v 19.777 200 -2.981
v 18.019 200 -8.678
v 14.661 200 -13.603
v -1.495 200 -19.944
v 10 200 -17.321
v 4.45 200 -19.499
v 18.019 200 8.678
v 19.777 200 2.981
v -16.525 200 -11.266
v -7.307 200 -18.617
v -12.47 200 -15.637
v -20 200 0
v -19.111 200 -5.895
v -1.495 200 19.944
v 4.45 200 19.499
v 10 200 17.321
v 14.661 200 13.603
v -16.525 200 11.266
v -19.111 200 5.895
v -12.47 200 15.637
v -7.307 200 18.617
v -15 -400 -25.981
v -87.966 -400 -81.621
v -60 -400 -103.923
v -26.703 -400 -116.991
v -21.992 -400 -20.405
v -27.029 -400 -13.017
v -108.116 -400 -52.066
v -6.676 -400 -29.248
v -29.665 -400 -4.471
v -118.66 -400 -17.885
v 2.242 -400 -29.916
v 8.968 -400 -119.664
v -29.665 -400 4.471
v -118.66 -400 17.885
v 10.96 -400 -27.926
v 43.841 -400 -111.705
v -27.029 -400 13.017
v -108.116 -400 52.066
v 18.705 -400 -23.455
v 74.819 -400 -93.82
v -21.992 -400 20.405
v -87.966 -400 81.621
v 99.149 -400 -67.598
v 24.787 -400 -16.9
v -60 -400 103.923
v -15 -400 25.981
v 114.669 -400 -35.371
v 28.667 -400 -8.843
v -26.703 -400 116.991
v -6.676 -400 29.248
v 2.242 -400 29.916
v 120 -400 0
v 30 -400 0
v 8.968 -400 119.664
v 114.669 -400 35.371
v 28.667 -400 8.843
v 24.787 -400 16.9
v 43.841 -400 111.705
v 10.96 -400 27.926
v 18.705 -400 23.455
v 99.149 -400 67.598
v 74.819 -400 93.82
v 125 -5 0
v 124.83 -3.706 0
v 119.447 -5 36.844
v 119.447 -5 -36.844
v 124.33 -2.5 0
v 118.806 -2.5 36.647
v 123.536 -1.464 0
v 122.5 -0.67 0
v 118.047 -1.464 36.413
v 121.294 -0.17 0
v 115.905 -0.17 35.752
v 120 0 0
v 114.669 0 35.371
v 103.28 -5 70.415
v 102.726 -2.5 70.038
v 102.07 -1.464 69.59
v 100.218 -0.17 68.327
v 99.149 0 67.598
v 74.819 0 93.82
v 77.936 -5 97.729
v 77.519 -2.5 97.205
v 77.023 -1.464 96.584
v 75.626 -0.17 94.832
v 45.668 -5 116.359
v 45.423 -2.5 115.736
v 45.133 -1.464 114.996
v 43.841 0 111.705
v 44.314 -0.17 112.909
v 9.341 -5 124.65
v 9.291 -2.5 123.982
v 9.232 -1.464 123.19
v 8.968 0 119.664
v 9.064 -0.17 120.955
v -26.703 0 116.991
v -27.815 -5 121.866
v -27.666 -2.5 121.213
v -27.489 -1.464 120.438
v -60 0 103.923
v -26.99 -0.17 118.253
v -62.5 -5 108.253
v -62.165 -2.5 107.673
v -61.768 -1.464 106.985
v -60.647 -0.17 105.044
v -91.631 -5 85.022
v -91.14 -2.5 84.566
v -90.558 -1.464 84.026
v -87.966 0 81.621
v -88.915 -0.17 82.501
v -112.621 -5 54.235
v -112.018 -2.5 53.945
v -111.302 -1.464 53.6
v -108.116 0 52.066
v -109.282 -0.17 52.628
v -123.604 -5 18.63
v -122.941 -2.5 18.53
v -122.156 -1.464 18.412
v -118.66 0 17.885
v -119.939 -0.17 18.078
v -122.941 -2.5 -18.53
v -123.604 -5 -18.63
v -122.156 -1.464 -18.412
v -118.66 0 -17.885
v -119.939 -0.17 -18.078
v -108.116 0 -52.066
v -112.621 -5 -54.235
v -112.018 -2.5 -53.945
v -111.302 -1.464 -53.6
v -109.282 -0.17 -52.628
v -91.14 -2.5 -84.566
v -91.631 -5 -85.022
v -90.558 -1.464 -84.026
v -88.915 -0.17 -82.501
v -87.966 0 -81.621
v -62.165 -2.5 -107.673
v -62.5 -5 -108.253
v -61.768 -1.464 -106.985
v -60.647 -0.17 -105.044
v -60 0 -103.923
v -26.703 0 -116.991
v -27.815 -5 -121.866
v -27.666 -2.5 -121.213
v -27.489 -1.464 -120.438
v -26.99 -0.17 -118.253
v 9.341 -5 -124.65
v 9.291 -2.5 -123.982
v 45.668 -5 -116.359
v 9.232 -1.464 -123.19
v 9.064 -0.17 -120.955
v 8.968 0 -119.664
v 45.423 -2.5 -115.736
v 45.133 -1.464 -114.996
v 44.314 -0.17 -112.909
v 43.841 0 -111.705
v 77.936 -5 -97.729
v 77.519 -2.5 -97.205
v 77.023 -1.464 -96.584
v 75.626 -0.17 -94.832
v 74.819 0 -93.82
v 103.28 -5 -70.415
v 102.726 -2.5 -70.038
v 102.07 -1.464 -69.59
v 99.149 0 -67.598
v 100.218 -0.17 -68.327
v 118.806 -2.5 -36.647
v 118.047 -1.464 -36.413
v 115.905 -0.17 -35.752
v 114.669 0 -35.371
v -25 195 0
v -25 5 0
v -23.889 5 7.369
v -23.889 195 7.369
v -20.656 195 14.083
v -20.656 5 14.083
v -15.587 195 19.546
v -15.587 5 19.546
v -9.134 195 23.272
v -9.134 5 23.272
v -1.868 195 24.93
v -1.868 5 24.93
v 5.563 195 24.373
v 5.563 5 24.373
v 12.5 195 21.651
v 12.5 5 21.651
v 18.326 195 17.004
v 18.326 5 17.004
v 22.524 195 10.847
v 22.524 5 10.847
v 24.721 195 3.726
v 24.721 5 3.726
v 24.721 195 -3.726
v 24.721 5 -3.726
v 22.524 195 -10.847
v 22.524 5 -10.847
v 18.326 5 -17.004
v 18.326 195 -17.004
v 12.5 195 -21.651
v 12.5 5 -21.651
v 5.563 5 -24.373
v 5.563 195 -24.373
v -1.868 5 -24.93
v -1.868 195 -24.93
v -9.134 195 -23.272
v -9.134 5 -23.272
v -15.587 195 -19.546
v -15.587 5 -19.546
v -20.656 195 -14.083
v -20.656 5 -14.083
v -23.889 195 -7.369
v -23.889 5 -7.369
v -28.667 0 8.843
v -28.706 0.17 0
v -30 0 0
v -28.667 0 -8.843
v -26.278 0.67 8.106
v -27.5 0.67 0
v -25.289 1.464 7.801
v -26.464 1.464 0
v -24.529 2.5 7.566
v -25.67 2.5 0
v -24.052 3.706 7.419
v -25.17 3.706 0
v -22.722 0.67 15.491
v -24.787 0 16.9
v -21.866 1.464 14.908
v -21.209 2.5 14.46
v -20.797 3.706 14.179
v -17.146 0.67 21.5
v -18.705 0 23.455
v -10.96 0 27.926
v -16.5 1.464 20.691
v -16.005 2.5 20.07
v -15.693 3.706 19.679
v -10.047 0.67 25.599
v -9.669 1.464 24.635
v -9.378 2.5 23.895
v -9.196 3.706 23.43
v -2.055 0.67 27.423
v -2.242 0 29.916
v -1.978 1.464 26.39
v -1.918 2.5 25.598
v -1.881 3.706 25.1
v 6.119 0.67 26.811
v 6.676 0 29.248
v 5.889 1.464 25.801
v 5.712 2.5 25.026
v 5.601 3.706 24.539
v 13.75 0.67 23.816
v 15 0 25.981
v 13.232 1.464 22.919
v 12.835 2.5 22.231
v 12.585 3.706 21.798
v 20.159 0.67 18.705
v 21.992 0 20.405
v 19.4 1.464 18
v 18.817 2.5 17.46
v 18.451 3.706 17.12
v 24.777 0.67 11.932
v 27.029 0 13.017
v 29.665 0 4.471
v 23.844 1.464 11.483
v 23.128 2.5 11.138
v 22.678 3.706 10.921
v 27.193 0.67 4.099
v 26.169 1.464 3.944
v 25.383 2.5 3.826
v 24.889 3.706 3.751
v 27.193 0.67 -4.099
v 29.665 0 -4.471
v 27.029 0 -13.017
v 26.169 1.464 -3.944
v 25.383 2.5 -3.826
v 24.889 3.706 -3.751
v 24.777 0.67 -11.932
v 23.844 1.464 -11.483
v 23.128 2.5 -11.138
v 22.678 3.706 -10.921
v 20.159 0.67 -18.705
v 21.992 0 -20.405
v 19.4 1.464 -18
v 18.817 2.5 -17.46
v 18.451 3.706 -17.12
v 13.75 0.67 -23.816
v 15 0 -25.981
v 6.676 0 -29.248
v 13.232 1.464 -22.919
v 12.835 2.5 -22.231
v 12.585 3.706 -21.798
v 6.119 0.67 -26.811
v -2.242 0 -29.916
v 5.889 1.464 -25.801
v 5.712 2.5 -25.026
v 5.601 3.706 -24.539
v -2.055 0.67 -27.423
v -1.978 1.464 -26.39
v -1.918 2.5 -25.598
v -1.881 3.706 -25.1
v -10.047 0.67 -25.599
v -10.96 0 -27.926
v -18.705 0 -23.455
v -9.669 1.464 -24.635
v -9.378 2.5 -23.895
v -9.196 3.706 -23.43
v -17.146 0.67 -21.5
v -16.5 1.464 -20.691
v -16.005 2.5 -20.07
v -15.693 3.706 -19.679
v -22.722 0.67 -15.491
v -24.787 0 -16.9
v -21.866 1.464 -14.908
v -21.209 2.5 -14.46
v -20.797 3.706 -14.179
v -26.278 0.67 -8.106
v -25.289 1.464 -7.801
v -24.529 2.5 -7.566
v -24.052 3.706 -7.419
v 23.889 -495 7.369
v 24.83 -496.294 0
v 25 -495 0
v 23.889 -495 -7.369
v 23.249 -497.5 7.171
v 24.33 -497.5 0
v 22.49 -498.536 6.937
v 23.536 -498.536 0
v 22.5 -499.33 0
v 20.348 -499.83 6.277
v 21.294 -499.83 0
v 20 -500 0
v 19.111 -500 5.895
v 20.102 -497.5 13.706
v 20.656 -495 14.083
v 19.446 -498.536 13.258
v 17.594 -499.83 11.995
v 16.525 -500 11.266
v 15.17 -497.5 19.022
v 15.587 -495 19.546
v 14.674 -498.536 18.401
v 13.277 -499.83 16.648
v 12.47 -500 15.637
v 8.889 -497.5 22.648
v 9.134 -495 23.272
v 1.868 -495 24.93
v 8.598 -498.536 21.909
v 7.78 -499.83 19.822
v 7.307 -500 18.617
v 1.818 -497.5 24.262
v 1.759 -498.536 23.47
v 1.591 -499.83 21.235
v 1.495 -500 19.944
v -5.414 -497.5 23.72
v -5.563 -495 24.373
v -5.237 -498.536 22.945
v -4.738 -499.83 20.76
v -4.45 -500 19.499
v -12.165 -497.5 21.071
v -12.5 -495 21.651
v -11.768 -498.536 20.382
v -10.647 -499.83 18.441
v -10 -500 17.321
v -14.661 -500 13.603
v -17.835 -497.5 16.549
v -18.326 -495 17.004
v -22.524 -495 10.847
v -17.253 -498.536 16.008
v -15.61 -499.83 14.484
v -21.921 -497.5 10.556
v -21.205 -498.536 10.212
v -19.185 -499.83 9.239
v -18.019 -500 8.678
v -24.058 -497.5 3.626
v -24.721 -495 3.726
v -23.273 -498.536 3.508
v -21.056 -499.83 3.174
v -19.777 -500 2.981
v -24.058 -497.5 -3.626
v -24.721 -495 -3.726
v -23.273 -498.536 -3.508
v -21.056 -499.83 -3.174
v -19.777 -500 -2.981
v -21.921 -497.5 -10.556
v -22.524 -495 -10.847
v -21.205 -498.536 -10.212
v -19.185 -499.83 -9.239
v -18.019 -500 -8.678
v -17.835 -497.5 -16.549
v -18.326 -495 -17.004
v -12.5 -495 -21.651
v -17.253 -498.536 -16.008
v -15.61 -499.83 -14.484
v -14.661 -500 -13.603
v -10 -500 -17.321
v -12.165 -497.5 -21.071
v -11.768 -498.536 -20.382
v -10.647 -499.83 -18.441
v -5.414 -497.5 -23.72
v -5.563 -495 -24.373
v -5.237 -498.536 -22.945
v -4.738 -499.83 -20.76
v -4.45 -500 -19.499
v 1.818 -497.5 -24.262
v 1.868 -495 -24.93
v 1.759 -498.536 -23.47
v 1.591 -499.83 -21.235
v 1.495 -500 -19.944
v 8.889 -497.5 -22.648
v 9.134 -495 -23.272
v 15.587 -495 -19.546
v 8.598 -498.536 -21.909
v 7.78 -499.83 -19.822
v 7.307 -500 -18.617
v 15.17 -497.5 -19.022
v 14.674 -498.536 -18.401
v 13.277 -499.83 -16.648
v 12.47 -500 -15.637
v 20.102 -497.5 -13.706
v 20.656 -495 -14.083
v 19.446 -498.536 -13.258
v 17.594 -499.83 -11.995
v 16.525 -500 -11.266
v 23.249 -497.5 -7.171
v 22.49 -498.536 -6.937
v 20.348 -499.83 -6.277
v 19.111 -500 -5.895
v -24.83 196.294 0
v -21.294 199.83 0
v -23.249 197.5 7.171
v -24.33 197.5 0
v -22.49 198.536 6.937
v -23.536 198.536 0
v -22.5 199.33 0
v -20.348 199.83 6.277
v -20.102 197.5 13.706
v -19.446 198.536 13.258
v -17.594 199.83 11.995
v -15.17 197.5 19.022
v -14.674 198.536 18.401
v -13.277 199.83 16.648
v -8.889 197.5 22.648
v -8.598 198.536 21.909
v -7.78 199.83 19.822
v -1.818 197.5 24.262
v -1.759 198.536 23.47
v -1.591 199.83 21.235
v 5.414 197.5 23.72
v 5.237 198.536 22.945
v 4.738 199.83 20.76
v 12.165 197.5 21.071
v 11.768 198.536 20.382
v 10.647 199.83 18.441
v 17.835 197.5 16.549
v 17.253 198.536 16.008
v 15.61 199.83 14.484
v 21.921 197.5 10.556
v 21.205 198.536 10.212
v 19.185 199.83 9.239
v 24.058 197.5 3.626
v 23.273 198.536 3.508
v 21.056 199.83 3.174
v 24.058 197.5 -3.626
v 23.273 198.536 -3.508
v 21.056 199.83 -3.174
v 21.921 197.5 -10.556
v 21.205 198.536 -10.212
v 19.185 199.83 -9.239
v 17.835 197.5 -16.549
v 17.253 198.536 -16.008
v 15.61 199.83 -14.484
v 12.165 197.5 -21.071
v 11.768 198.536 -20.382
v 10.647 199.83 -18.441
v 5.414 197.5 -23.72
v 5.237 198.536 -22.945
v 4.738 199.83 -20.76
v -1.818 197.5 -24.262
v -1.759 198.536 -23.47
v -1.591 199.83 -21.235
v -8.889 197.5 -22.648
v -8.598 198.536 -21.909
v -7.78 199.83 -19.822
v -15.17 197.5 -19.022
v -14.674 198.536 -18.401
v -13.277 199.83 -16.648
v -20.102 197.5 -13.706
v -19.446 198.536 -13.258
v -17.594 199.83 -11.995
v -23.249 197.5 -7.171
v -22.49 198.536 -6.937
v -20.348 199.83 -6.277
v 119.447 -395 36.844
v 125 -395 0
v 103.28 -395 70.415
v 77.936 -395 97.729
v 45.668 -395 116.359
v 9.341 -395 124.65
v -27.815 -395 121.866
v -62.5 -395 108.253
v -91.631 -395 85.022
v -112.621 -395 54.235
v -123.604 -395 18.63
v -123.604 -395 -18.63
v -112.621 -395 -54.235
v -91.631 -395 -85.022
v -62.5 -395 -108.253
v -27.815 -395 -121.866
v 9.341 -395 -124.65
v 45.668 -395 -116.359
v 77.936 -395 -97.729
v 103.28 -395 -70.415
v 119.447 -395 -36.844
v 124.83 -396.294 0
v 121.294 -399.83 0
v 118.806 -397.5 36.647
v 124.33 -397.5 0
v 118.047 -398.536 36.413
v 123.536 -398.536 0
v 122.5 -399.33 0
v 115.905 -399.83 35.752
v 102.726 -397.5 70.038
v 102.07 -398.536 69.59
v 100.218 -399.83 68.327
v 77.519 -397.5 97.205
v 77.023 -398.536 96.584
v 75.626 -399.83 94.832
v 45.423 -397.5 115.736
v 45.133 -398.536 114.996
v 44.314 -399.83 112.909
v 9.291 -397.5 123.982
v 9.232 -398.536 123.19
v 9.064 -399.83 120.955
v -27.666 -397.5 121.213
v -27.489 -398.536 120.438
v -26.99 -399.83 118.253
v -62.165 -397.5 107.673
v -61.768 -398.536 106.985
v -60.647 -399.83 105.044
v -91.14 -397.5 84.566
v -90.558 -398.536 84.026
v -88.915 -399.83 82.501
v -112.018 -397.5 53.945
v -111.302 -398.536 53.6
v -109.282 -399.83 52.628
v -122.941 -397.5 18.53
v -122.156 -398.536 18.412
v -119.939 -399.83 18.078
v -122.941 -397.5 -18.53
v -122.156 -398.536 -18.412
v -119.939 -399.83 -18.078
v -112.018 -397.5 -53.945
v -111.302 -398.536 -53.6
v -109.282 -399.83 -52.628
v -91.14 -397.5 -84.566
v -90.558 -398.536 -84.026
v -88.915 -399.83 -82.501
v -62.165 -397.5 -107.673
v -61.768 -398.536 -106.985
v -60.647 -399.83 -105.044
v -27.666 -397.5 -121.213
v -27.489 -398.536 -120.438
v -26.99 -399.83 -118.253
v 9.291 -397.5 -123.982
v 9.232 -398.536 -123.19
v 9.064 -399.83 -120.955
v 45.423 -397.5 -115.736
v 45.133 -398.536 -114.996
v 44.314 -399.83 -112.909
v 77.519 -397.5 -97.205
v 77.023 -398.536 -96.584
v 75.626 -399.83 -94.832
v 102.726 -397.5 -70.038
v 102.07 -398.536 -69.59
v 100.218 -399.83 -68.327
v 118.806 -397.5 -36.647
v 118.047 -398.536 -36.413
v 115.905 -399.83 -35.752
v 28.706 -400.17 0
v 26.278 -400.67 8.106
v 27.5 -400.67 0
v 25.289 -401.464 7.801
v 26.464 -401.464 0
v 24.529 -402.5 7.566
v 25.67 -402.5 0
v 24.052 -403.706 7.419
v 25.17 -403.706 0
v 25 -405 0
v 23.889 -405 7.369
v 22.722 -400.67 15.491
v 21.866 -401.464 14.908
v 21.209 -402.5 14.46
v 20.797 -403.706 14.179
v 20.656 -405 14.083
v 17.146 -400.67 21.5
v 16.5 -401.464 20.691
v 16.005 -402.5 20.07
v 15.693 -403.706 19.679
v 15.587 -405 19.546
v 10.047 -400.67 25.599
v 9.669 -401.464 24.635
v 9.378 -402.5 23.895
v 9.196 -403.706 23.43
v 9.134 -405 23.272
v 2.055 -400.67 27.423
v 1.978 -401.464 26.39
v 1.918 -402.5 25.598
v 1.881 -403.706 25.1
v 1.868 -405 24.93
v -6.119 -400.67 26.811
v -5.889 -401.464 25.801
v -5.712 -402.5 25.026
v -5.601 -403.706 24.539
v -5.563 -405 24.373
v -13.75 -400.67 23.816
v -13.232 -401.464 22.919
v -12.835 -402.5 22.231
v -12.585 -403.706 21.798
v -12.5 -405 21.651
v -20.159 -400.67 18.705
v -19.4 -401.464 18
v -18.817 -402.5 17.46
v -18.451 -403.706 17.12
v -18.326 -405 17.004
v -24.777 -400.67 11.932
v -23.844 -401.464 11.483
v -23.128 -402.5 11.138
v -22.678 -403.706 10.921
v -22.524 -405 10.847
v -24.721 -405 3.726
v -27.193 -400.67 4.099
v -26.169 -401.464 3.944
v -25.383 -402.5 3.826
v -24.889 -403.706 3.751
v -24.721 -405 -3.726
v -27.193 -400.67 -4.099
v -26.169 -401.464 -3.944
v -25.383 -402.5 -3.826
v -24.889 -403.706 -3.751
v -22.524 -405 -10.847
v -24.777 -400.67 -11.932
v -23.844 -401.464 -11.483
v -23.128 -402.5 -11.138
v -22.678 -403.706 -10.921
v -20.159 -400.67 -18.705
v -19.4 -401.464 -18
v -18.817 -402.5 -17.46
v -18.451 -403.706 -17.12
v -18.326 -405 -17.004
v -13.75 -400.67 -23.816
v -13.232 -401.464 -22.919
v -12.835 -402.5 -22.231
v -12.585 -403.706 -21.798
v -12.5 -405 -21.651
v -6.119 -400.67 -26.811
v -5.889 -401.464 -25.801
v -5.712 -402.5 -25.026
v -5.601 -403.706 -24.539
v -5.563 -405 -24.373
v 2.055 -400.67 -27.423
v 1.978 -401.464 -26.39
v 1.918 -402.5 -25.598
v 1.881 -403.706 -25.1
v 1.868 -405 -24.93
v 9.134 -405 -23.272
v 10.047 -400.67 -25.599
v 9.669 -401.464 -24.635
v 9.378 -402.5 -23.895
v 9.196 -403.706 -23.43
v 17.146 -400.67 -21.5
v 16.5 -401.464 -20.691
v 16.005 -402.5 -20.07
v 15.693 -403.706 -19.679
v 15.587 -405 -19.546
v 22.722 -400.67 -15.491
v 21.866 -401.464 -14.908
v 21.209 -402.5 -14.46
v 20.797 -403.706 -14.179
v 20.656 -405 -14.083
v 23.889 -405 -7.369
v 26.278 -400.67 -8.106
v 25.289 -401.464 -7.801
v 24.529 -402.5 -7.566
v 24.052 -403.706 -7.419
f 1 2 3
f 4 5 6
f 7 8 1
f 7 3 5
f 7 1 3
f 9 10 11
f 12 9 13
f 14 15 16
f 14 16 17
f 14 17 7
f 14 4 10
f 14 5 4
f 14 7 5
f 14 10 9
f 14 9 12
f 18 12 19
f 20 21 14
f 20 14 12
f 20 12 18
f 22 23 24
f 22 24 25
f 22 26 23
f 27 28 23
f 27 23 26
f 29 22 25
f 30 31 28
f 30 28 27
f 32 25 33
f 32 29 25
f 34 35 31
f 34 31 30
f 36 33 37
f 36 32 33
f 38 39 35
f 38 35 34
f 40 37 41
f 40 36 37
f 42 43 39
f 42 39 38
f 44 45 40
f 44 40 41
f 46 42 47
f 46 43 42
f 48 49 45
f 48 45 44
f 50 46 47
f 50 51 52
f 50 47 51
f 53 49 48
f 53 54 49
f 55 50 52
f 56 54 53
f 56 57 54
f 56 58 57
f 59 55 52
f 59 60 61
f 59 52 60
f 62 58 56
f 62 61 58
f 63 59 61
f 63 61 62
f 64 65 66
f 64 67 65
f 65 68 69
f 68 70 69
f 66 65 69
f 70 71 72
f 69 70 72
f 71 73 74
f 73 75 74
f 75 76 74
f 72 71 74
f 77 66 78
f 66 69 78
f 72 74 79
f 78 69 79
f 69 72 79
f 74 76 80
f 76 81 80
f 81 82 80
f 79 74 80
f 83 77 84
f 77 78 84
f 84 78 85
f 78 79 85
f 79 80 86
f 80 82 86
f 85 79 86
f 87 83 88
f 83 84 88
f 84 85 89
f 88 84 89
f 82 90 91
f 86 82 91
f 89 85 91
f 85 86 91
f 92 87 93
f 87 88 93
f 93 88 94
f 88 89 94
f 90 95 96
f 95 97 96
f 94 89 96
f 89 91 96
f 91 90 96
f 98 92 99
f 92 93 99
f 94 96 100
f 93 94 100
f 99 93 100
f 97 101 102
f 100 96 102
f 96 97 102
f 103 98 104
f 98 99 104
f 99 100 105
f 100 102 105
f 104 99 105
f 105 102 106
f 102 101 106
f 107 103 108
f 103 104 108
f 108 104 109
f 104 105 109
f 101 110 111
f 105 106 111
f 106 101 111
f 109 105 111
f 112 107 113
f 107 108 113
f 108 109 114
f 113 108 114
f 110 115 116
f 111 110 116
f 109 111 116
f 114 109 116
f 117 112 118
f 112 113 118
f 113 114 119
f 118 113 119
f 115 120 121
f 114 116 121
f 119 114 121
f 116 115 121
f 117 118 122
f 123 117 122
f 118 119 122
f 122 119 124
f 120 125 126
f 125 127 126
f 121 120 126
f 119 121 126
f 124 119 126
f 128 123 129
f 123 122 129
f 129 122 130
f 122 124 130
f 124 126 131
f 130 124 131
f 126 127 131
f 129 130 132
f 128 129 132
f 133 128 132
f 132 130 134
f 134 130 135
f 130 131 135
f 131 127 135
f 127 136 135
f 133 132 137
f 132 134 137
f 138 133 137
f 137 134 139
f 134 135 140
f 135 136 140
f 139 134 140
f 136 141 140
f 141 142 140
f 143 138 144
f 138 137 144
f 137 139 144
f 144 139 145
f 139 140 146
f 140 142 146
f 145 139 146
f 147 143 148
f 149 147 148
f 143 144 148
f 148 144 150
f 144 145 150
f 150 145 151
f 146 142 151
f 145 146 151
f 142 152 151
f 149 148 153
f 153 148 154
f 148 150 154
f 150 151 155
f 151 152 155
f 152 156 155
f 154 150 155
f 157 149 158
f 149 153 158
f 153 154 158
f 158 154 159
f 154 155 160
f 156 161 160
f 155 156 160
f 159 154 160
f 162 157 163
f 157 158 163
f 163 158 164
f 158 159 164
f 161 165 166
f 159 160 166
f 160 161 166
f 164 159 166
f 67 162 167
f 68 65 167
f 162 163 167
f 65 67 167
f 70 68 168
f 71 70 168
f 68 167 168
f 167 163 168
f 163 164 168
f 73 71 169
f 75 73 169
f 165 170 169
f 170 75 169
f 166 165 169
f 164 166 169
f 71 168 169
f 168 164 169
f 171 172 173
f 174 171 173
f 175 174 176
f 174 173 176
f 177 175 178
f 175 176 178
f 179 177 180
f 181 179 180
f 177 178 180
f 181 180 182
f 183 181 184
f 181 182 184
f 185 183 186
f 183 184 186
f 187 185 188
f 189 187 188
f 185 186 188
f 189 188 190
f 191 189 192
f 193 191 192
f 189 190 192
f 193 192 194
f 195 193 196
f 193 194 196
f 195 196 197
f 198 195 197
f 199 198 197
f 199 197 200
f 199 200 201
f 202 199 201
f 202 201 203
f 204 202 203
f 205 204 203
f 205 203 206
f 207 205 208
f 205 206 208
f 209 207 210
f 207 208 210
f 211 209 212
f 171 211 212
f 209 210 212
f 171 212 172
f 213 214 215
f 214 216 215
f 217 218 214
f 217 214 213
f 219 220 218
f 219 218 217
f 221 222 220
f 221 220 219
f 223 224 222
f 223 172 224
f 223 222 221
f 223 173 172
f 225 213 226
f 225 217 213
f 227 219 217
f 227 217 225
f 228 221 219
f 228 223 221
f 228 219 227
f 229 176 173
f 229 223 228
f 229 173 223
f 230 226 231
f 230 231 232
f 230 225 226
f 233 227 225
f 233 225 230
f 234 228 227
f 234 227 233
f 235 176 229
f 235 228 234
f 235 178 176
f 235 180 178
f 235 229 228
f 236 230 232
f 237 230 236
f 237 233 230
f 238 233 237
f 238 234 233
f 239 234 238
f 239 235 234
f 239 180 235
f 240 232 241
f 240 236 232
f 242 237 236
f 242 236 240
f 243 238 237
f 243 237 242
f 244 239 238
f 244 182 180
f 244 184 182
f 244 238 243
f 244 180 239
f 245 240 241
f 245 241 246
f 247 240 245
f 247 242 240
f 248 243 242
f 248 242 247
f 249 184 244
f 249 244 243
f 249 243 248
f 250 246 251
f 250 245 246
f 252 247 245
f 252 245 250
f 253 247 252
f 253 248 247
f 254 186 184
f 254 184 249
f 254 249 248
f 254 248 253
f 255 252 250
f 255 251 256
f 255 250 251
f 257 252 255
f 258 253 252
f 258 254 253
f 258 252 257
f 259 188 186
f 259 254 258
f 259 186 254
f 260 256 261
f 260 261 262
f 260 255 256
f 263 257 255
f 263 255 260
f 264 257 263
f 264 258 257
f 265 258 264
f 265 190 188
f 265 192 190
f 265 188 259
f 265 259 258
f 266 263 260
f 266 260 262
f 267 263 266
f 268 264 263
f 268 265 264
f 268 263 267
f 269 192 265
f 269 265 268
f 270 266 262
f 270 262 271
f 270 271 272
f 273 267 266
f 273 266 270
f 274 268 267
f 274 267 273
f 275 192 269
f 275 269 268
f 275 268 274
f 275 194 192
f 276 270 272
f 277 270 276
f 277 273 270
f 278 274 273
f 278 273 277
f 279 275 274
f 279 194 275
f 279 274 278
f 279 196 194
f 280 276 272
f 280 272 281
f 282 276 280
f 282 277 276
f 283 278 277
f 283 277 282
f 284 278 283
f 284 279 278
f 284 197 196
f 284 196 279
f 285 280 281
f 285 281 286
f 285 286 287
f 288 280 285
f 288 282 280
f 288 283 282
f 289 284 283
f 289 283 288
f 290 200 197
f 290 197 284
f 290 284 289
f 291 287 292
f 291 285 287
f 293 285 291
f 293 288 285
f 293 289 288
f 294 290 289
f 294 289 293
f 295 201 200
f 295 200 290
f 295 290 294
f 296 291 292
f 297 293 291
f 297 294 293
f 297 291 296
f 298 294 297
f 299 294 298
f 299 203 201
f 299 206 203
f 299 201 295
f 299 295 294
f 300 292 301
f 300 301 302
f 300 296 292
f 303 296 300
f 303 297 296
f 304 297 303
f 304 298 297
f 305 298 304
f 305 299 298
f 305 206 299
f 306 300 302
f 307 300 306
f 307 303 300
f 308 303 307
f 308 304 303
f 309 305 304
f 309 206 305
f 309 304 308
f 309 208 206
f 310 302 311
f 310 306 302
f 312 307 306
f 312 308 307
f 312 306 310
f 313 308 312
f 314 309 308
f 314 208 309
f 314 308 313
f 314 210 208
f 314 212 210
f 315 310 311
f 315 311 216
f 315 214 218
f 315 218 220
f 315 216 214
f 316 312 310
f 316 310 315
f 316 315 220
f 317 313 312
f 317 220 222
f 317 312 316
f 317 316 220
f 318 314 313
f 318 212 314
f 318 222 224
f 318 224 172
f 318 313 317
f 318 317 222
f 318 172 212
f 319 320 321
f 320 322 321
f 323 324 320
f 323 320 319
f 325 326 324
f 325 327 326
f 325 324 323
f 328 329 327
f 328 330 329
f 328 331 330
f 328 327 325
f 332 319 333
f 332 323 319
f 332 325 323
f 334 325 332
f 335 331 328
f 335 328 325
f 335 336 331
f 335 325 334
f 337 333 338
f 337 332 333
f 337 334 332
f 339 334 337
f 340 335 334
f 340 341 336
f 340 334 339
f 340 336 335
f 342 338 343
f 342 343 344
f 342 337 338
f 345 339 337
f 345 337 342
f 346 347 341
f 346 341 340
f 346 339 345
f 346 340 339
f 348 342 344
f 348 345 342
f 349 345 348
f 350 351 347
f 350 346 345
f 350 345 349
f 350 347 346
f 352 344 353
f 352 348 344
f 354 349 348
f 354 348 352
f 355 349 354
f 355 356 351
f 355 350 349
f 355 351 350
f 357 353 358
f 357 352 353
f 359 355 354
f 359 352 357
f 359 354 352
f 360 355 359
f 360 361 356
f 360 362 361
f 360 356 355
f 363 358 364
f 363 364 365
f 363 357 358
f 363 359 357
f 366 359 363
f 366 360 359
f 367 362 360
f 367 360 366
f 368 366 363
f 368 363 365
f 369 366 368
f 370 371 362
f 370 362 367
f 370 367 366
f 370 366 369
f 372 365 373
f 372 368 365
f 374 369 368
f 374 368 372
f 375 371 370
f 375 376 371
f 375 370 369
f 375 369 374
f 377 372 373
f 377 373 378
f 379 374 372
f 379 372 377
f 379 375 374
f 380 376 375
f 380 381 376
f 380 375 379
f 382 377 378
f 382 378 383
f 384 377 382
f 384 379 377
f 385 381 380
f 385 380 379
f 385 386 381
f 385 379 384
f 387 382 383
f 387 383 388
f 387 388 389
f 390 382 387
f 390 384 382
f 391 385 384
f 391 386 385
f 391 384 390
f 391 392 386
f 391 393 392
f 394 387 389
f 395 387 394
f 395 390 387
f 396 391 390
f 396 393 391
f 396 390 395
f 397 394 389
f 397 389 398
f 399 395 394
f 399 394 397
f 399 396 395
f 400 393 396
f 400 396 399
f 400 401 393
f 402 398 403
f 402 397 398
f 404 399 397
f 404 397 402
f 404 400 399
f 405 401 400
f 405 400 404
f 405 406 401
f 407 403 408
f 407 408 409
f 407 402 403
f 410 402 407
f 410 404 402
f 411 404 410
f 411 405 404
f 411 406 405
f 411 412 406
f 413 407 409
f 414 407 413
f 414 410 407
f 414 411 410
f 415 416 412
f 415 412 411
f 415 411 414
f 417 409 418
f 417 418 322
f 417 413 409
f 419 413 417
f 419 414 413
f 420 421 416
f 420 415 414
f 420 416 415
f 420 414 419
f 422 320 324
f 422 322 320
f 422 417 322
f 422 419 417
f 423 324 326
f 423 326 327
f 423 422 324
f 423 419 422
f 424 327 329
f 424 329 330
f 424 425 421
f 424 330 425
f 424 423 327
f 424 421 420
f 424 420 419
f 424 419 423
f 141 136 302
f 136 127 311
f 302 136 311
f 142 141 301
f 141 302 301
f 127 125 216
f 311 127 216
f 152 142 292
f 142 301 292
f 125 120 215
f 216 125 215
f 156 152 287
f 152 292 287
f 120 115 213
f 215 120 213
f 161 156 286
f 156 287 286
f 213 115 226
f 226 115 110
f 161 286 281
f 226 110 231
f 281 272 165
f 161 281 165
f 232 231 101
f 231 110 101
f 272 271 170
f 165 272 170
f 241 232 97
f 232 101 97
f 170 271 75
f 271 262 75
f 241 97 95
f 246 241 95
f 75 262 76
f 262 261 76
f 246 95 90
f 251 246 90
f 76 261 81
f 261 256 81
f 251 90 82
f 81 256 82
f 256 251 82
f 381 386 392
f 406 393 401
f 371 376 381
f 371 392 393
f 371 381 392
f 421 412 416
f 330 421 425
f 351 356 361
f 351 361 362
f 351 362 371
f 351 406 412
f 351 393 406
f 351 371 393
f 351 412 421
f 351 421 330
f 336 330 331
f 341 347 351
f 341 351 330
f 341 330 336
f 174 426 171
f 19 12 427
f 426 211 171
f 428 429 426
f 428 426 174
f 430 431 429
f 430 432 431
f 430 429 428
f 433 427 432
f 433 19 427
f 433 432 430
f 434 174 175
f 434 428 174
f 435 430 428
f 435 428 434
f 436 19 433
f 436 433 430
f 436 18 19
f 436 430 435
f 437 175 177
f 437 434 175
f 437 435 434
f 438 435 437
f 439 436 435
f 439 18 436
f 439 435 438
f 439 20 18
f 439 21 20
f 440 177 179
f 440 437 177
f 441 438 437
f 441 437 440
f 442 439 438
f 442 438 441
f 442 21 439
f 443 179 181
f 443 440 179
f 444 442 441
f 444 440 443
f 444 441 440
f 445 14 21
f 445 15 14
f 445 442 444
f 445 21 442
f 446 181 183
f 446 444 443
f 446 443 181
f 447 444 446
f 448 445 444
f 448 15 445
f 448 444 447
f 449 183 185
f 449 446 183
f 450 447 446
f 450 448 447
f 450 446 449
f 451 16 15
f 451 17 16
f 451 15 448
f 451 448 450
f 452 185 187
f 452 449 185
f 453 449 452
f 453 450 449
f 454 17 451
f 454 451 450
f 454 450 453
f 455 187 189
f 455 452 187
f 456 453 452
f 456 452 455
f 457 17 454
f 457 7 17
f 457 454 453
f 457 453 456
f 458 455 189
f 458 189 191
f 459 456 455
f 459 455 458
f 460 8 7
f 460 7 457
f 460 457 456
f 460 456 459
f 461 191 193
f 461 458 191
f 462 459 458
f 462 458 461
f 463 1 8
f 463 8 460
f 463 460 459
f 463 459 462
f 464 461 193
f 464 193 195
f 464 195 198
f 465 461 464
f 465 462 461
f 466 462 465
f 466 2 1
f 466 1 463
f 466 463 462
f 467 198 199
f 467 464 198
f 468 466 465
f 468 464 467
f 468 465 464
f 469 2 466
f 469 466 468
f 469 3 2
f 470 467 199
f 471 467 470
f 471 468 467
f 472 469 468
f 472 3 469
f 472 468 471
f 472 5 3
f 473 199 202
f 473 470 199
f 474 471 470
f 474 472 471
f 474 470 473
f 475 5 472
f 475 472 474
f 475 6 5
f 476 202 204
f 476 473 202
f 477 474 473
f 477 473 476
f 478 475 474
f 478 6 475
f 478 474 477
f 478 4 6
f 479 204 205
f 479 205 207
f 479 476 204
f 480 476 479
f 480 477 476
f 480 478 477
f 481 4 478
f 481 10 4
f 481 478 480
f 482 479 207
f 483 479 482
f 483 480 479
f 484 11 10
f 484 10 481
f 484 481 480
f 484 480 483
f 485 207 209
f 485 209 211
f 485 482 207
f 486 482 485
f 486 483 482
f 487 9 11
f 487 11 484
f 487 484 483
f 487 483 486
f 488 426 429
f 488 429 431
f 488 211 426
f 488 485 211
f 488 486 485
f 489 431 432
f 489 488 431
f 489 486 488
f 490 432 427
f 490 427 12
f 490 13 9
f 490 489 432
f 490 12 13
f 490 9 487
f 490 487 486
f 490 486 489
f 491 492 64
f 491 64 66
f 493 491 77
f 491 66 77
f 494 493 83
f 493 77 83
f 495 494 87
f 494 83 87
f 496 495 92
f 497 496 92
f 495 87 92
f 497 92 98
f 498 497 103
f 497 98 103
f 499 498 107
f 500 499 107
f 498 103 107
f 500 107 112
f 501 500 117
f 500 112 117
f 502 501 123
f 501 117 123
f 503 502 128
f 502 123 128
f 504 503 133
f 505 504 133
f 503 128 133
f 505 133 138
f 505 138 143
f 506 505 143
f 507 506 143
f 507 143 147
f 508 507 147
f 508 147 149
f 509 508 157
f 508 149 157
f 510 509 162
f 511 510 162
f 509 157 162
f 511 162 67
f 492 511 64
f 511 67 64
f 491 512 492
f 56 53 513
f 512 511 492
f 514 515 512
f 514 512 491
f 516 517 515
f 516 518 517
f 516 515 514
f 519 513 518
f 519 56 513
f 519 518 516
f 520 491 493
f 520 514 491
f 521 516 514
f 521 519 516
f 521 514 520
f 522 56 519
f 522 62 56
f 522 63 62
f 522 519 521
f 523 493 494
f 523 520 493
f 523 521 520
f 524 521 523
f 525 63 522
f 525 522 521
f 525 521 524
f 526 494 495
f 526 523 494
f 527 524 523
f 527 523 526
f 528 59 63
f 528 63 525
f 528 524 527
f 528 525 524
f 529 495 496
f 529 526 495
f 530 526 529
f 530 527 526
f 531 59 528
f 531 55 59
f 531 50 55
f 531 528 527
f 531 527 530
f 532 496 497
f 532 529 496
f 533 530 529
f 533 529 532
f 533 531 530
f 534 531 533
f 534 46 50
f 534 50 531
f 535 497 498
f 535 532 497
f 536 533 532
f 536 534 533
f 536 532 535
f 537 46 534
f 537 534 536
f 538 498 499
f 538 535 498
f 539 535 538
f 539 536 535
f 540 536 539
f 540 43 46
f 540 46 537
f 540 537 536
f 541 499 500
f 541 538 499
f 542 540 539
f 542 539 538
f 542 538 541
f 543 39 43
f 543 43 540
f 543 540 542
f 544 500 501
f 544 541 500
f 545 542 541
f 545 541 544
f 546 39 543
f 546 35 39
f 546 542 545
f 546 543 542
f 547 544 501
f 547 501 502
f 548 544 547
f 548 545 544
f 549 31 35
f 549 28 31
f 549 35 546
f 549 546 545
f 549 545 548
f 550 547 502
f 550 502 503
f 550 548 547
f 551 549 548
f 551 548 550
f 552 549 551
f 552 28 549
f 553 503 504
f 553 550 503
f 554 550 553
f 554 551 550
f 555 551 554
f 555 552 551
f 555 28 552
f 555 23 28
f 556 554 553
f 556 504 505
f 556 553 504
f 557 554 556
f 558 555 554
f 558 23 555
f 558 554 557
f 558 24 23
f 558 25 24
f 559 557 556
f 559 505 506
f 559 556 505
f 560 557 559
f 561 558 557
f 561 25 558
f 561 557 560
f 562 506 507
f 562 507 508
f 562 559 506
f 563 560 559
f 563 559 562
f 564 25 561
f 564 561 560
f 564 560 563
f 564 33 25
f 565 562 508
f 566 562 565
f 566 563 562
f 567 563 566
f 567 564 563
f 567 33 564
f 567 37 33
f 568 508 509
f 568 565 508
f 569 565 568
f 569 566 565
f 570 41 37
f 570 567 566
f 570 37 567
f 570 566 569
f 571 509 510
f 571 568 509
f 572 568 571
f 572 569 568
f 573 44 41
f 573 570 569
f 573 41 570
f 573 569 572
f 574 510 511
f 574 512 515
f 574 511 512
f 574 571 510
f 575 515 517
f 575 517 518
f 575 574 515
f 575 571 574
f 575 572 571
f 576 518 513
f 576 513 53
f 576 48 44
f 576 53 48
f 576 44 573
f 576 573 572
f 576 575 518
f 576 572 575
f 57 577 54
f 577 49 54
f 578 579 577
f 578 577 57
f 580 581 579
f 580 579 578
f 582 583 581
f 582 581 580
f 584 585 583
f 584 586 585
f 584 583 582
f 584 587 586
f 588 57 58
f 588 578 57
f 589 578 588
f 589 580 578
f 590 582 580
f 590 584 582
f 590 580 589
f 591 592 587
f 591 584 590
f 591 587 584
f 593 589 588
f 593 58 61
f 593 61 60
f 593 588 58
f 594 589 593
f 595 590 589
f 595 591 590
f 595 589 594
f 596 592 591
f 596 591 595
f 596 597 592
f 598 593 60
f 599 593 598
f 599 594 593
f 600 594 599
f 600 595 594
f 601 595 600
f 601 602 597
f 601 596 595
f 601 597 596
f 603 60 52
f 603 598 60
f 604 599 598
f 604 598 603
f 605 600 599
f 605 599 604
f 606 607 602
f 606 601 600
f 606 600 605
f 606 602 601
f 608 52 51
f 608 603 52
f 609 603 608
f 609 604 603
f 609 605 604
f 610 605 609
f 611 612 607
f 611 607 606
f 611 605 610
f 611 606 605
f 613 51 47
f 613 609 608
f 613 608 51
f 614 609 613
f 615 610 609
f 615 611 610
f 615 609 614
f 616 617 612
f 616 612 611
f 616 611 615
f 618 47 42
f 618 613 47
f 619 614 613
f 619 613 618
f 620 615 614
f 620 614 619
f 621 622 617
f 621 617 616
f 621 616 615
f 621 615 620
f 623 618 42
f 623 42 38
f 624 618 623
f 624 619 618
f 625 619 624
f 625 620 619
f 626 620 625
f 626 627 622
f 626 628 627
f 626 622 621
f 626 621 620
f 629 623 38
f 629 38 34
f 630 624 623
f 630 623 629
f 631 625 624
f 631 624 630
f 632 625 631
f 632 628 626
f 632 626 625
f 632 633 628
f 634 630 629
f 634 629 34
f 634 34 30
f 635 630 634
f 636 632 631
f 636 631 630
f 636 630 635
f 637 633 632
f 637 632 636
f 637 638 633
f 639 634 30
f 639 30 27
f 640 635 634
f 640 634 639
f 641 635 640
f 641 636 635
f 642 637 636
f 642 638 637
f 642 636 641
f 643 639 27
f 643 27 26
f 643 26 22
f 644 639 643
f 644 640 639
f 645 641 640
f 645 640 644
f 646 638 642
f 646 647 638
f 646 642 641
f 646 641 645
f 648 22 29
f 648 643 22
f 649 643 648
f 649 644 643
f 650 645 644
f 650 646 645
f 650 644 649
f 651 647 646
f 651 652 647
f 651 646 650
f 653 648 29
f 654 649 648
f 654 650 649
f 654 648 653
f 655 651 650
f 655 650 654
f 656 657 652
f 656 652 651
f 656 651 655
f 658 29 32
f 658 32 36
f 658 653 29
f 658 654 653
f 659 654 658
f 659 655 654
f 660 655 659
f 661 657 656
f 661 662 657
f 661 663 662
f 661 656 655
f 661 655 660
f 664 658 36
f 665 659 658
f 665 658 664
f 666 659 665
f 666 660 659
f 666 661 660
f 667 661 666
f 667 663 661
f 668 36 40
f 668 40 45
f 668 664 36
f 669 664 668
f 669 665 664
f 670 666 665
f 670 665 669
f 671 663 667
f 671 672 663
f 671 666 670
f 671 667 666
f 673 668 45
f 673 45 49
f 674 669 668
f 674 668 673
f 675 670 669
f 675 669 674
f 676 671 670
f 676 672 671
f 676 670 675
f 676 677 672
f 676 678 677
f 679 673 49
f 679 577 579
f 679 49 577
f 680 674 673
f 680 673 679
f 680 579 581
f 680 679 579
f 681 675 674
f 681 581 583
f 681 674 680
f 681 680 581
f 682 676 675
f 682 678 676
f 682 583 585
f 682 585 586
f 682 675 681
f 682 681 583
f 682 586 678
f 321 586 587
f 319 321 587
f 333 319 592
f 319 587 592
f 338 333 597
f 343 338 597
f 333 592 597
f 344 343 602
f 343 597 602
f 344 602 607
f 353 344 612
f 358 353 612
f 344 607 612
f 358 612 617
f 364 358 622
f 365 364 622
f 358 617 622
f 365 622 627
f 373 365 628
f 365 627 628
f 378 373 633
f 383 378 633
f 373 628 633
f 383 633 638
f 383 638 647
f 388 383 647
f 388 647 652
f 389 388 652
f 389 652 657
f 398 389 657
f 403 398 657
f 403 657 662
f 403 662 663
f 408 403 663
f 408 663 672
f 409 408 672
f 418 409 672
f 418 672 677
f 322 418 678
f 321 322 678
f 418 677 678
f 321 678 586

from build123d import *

# Parameters (mm, degrees)
F0_R     = 125
F1_DEPTH = 400
F3_DEPTH = 25
F4_R     = 5
F5_R     = 25
F6_DEPTH = 100
F7_R     = 5
F8_R     = 25
F9_DEPTH = 200
F10_R    = 5


with BuildPart() as f1:
    # F0 (on Front) → F1 (new body)
    with BuildSketch(Plane.XZ):
        Circle(F0_R)
    extrude(amount=F1_DEPTH)

    # F0 (on Front) → F3 (join)
    with BuildSketch(Plane.XZ):
        Circle(F0_R)
    extrude(amount=F3_DEPTH)

    # F4
    f4_edges = [f1.edges().sort_by_distance(p)[0] for p in [
        (-125, 0, 0),
        (-125, -400, 0),
    ]]
    fillet(f4_edges, radius=F4_R)

    # F5 (on face) → F6 (join)
    with BuildSketch(Plane.XZ.offset(400)):
        Circle(F5_R)
    extrude(amount=F6_DEPTH)

    # F7
    f7_edges = [f1.edges().sort_by_distance(p)[0] for p in [
        (-25, -400, 0),
        (-25, -500, 0),
    ]]
    fillet(f7_edges, radius=F7_R)

    # F8 (on face) → F9 (join)
    with BuildSketch(Plane(origin=(0, 0, 0), x_dir=(-1, 0, 0), z_dir=(0, 1, 0))):
        Circle(F8_R)
    extrude(amount=F9_DEPTH)

    # F10
    f10_edges = [f1.edges().sort_by_distance(p)[0] for p in [
        (25, 0, 0),
        (25, 200, 0),
    ]]
    fillet(f10_edges, radius=F10_R)


solid = f1.part
